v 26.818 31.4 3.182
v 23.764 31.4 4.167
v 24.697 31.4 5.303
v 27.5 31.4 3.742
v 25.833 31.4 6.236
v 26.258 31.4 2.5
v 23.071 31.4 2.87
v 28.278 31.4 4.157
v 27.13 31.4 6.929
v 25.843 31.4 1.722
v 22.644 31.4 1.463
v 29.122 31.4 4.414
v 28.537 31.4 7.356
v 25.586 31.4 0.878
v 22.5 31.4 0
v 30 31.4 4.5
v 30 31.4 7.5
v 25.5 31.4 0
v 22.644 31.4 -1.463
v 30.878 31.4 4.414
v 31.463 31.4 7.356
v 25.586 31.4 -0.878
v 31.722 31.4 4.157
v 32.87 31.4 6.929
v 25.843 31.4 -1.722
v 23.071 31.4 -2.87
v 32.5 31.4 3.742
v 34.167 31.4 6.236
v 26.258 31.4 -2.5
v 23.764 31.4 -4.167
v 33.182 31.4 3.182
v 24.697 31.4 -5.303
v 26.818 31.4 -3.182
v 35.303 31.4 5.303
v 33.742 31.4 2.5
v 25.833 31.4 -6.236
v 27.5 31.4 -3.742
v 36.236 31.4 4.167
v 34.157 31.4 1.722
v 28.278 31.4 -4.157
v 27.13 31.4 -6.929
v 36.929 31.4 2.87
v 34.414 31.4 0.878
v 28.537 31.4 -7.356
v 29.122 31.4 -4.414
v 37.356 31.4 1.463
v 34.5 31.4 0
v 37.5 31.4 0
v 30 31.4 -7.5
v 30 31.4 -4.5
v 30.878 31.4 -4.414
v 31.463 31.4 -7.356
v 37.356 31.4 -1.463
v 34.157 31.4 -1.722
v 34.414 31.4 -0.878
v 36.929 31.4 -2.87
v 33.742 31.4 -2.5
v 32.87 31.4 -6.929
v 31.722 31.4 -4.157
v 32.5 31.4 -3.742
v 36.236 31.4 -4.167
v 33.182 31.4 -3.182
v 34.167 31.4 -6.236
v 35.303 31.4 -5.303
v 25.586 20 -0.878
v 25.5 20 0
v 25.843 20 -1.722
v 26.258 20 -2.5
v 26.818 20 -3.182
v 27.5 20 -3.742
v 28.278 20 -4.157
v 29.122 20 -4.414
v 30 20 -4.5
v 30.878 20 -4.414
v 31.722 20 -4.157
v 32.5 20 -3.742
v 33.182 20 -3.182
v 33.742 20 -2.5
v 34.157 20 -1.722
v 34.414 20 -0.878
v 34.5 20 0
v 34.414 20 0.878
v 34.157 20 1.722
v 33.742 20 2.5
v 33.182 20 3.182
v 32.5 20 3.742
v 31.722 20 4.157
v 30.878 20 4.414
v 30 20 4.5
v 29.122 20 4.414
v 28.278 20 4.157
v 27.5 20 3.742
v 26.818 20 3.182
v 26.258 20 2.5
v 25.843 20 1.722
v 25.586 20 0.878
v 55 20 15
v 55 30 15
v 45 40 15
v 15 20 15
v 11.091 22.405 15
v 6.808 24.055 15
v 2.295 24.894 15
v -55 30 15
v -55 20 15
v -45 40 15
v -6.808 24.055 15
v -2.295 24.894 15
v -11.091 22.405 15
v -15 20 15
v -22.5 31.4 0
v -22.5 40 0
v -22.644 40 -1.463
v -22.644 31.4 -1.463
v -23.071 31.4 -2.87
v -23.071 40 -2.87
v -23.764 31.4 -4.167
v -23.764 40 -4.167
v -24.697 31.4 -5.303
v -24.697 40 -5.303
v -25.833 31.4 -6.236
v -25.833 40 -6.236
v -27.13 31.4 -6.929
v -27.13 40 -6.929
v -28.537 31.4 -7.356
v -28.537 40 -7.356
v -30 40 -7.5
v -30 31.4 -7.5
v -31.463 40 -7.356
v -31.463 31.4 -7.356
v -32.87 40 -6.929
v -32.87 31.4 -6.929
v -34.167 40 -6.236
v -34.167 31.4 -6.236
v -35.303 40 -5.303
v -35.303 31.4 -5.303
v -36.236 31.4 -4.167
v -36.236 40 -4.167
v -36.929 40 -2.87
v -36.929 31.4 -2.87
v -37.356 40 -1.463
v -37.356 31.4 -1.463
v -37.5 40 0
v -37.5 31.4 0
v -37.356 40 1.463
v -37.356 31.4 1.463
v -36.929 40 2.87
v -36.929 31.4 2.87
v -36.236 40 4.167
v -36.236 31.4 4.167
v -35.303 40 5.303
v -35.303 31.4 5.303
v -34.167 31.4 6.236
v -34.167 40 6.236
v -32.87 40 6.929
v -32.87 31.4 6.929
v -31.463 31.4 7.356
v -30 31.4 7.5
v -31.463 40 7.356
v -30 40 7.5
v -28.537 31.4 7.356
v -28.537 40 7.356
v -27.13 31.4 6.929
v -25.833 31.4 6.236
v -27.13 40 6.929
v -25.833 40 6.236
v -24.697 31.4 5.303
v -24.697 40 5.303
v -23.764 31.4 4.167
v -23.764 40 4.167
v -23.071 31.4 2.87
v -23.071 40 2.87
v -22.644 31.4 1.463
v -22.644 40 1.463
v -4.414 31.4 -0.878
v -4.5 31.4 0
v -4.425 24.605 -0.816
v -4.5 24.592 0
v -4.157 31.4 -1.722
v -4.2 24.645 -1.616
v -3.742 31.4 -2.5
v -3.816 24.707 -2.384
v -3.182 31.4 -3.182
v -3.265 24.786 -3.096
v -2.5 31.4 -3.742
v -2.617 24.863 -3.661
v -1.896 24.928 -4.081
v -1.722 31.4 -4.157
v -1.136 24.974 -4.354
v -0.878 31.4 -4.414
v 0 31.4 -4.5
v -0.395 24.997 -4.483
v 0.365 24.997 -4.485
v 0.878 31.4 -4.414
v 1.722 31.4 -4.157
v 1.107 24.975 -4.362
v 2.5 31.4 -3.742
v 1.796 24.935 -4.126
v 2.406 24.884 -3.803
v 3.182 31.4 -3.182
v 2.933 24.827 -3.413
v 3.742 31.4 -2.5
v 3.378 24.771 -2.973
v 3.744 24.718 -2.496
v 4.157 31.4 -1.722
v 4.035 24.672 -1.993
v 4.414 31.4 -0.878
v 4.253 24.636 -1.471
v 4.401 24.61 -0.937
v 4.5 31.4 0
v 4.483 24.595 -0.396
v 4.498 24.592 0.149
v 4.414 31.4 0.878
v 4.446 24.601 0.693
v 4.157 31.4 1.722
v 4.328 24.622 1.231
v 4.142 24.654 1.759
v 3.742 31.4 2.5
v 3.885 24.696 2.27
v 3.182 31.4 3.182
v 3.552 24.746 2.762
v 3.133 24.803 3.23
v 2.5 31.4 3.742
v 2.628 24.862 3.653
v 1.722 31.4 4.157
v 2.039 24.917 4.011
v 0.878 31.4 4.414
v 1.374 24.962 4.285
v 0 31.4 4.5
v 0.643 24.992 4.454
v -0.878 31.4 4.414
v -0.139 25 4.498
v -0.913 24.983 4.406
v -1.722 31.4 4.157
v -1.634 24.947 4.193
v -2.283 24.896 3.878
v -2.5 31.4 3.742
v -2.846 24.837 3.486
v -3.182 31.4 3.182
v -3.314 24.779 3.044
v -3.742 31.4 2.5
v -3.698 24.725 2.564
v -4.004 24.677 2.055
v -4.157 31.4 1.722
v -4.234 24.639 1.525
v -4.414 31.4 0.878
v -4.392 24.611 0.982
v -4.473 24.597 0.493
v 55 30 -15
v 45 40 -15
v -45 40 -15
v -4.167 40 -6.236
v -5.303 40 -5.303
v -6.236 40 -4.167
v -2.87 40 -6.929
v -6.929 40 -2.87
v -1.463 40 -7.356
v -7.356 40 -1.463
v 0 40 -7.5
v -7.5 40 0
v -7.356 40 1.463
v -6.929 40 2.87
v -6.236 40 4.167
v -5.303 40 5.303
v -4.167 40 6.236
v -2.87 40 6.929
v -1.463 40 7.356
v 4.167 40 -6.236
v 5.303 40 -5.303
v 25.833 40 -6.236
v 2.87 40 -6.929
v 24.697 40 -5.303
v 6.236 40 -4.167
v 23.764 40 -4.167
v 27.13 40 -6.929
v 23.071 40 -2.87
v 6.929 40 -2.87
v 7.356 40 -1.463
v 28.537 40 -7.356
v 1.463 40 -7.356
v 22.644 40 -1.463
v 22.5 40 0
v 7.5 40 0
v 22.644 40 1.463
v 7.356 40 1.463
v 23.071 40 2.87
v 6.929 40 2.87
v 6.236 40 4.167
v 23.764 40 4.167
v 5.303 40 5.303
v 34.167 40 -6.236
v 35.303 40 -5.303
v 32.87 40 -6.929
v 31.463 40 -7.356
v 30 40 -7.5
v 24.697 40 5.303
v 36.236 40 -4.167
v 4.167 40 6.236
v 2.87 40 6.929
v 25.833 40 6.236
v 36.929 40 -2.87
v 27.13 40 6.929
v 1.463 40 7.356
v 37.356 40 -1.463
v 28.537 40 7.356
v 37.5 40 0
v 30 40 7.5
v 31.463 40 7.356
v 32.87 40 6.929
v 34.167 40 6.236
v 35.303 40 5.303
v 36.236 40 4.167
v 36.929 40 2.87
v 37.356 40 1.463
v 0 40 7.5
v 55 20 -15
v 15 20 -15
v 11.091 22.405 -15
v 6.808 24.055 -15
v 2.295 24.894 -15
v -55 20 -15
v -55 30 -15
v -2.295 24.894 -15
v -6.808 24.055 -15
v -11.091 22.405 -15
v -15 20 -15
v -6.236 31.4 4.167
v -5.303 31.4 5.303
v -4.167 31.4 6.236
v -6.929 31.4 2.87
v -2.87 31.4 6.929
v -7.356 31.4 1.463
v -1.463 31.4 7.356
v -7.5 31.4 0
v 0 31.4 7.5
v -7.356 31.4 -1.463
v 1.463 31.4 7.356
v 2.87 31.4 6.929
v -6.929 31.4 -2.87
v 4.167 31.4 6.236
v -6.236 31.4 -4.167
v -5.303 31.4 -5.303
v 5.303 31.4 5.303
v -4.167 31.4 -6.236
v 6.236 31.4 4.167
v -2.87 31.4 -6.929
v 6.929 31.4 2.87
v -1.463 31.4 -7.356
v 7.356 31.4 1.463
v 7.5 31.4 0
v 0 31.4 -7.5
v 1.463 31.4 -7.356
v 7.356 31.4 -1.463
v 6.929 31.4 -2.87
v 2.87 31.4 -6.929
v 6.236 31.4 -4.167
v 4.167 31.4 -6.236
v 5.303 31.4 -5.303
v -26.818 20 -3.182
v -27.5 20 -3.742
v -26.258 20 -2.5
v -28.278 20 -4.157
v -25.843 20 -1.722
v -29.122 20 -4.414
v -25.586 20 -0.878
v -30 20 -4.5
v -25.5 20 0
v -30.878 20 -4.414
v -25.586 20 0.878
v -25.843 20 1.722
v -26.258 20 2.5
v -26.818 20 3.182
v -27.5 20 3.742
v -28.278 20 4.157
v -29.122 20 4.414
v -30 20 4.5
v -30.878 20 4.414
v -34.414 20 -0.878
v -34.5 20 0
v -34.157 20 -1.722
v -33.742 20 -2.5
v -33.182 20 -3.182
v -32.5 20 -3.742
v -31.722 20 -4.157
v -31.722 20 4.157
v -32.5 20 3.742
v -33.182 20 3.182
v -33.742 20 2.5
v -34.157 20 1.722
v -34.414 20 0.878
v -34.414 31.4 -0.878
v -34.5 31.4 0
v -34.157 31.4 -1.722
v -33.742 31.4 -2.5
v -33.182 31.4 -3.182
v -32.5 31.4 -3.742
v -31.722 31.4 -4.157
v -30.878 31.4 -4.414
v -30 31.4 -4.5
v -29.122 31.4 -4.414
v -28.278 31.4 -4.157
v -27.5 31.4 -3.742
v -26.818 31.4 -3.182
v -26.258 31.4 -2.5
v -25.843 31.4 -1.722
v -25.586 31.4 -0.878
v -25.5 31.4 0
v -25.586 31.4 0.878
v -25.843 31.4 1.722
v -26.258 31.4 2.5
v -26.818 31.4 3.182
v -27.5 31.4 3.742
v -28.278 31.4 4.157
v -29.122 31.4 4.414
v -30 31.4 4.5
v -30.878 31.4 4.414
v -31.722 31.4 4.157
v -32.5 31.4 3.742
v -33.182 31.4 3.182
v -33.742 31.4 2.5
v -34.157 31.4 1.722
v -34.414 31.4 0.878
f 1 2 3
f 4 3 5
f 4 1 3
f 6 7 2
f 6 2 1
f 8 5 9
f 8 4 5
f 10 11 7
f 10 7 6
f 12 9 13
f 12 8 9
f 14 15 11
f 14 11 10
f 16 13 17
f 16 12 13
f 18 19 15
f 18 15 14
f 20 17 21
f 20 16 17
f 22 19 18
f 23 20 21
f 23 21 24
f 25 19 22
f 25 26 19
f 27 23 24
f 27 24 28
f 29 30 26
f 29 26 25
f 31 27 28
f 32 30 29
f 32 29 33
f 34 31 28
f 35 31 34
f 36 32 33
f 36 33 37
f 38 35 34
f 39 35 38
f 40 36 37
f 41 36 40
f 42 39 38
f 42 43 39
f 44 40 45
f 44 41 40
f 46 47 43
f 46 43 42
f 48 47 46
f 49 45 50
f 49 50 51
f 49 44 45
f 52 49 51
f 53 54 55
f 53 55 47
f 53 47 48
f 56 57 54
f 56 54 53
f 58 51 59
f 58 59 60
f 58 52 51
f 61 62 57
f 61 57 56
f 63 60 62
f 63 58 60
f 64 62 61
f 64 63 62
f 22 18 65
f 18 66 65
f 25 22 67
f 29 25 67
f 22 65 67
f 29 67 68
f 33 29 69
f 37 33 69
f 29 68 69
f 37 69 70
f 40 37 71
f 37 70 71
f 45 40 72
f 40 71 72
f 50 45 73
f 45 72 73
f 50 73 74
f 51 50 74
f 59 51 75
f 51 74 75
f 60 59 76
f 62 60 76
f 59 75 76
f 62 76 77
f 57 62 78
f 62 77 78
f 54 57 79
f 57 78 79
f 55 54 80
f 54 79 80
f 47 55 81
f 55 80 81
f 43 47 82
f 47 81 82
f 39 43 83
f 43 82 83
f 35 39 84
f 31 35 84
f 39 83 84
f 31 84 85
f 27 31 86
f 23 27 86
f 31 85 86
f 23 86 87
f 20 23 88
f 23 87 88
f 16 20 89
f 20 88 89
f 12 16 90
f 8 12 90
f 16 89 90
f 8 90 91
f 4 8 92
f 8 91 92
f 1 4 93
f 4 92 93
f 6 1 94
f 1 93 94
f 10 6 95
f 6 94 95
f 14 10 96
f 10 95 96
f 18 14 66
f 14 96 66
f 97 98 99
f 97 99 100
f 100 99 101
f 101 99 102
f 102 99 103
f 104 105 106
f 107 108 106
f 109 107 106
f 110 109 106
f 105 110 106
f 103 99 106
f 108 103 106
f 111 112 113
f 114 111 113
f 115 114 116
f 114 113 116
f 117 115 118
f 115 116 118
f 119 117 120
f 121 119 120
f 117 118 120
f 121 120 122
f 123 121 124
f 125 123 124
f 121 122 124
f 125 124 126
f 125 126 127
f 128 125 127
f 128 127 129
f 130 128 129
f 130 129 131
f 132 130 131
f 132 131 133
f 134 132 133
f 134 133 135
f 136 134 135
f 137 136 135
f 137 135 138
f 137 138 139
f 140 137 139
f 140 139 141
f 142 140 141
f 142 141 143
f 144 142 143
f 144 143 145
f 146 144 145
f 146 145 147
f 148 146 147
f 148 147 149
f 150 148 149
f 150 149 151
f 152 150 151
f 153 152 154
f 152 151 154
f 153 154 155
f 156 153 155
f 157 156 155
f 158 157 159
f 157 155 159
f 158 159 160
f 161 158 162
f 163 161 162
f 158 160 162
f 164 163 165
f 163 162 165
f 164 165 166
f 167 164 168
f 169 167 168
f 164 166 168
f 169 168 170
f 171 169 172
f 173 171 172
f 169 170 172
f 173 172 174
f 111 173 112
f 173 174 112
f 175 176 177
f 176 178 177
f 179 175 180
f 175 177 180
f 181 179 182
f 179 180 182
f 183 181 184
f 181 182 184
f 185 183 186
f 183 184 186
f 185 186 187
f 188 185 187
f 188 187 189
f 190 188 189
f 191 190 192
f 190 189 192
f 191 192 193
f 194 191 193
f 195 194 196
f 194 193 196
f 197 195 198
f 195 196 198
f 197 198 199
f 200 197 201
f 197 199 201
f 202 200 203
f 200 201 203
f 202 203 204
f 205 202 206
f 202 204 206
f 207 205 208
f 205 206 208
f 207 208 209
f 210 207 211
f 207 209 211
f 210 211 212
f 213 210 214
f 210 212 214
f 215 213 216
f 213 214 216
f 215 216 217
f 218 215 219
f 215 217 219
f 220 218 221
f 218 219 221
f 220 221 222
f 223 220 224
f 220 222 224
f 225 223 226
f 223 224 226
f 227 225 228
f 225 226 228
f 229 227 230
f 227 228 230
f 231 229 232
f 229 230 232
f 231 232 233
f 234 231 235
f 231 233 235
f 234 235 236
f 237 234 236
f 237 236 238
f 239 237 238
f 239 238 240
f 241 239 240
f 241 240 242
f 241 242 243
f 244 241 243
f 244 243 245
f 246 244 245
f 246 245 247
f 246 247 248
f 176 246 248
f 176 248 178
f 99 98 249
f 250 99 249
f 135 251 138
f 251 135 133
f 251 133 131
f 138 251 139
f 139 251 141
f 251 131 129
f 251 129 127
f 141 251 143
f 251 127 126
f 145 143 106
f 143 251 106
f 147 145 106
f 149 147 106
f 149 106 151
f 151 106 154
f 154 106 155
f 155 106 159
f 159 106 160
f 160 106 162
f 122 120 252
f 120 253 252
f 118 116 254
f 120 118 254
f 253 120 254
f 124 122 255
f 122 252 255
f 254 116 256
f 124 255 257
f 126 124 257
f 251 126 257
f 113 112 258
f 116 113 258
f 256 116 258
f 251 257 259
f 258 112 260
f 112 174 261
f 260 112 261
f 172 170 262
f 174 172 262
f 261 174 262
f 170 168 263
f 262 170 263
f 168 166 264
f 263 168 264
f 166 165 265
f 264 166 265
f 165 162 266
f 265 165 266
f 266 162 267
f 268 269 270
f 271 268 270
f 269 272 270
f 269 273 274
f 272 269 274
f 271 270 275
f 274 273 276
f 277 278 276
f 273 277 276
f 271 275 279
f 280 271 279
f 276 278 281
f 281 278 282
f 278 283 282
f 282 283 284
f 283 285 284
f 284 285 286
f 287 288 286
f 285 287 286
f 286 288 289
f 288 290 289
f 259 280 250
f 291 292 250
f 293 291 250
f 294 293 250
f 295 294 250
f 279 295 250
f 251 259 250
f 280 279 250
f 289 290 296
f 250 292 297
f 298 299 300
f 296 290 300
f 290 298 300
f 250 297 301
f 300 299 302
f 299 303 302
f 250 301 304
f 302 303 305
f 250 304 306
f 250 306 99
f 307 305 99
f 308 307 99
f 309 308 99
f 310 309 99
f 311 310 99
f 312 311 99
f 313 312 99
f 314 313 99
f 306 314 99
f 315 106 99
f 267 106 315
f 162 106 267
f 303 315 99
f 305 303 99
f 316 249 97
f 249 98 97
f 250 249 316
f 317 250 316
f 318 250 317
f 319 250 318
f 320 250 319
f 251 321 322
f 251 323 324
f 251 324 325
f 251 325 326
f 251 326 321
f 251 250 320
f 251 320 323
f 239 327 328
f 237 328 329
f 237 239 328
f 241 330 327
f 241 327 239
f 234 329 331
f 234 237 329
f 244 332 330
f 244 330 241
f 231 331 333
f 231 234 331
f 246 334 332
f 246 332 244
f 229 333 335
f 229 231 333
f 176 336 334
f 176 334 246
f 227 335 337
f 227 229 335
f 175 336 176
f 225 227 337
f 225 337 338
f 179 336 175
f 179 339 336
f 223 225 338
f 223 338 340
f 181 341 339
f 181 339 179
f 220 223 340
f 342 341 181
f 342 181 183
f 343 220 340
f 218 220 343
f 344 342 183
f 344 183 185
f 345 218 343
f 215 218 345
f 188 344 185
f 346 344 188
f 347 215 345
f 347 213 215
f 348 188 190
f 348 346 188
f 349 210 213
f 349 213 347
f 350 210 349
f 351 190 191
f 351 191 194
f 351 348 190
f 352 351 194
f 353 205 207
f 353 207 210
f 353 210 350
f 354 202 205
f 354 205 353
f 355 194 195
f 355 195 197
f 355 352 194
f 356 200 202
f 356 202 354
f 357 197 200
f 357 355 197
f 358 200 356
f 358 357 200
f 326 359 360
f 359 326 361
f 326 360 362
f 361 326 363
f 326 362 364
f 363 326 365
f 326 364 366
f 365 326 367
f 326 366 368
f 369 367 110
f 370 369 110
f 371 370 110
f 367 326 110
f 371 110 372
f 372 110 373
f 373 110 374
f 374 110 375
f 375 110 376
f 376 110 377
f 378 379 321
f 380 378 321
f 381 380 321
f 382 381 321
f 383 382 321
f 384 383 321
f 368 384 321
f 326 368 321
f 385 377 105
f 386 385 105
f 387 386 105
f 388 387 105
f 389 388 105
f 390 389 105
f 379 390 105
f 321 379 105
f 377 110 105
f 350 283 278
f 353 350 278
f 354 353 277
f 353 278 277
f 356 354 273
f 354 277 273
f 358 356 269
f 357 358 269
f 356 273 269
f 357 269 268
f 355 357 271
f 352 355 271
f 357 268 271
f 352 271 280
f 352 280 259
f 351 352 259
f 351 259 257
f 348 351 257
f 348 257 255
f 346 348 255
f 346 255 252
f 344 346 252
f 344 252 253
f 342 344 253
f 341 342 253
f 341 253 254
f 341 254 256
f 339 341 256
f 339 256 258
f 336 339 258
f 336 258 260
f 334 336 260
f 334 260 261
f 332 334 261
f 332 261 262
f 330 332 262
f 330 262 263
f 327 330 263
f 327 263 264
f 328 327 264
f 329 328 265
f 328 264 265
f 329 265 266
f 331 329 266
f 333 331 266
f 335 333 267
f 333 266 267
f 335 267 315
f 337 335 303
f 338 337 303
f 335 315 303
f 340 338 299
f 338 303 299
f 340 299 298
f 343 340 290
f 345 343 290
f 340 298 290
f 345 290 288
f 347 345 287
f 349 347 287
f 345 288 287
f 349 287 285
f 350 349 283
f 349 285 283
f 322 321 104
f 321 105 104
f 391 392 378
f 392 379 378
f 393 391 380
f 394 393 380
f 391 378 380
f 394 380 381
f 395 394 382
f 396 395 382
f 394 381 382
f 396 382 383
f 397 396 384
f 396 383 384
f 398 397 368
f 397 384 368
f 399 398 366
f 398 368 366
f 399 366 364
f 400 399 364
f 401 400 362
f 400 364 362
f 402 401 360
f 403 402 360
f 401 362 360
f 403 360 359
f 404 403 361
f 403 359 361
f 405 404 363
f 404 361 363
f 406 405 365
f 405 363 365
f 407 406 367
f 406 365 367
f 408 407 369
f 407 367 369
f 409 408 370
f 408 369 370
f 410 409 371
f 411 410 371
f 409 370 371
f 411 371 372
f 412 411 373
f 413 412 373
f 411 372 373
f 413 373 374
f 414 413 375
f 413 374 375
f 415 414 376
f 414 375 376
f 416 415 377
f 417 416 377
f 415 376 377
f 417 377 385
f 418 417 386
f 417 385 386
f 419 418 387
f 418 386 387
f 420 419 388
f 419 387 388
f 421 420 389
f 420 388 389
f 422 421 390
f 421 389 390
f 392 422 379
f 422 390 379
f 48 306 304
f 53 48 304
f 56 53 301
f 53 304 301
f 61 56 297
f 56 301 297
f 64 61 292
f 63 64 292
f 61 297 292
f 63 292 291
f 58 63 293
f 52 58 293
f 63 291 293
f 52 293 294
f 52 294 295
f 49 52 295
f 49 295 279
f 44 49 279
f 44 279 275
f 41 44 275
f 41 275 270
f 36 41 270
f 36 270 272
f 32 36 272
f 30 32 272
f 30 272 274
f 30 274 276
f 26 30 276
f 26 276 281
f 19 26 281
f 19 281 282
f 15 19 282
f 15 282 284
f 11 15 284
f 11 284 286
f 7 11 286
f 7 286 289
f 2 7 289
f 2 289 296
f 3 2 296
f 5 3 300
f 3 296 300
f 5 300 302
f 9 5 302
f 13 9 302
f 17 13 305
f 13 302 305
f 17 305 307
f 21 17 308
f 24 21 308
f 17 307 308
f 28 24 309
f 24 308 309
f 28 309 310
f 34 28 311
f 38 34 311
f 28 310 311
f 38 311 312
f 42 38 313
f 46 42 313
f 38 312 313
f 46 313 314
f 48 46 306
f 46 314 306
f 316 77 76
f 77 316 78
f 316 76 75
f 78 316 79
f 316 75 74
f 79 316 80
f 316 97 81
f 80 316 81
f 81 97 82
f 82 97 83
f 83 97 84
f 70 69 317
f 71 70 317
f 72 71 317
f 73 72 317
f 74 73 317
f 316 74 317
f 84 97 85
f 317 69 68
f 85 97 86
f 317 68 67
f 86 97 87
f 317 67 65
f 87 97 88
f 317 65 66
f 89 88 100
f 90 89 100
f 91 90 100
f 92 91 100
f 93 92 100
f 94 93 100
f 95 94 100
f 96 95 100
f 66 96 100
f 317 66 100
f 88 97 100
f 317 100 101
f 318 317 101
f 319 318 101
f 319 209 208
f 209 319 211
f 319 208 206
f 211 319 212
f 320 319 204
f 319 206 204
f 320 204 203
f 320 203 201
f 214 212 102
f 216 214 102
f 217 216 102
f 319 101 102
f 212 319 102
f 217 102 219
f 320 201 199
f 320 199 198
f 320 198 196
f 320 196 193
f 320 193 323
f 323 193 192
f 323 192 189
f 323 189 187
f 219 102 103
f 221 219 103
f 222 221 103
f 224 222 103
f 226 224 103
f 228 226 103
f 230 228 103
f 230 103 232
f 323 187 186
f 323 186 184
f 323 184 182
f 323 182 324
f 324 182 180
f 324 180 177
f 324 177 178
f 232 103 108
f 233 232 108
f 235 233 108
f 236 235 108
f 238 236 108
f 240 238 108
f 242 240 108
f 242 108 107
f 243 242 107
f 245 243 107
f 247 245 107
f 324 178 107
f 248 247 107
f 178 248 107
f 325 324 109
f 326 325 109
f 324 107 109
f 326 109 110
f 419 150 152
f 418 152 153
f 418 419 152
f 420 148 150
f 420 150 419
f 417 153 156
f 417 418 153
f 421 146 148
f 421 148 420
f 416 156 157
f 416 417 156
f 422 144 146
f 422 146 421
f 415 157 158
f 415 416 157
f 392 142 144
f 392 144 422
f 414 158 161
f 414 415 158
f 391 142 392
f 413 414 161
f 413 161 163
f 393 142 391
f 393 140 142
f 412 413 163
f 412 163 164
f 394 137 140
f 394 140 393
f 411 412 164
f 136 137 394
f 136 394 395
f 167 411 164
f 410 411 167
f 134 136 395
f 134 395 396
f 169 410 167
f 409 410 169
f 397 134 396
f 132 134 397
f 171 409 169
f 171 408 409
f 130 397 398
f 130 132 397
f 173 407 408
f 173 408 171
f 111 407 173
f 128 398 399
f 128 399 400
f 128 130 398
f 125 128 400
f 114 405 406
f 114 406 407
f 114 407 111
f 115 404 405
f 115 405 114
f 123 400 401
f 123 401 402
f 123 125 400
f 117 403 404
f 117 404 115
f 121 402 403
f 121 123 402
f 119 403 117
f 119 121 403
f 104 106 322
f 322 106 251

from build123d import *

# Parameters (mm, degrees)
EXTRUDE_1_DEPTH             = 15
HOLE_WIZARD_M81_D           = 9
HOLE_WIZARD_M81_CBORE_D     = 15
HOLE_WIZARD_M81_CBORE_DEPTH = 8.6
CHAMFER_1_SIZE              = 10


with BuildPart() as part:
    # Эскиз1 → Бобышка-Вытянуть1 (new, symmetric)
    with BuildSketch(Plane.XY):
        with BuildLine():
            Line((-15, 20), (-55, 20))
            Line((-55, 20), (-55, 40))
            Line((-55, 40), (55, 40))
            Line((55, 40), (55, 20))
            Line((55, 20), (15, 20))
            ThreePointArc((15, 20), (0, 25), (-15, 20))
        make_face()
    extrude(amount=EXTRUDE_1_DEPTH, both=True)

    # Цековка для винта с внутренним шестигранником M81 (through all)
    with Locations(Plane(origin=(0, 40, 0), x_dir=(1, 0, 0), z_dir=(0, 1, 0))):
        with Locations((0, 0), (-30, 0), (30, 0)):
            CounterBoreHole(HOLE_WIZARD_M81_D / 2, HOLE_WIZARD_M81_CBORE_D / 2, HOLE_WIZARD_M81_CBORE_DEPTH)

    # Фаска1
    chamfer_1_edges = [part.edges().sort_by_distance(p)[0] for p in [
        (-55, 40, 0),
        (55, 40, 0),
    ]]
    chamfer(chamfer_1_edges, length=CHAMFER_1_SIZE)


solid = part.part
